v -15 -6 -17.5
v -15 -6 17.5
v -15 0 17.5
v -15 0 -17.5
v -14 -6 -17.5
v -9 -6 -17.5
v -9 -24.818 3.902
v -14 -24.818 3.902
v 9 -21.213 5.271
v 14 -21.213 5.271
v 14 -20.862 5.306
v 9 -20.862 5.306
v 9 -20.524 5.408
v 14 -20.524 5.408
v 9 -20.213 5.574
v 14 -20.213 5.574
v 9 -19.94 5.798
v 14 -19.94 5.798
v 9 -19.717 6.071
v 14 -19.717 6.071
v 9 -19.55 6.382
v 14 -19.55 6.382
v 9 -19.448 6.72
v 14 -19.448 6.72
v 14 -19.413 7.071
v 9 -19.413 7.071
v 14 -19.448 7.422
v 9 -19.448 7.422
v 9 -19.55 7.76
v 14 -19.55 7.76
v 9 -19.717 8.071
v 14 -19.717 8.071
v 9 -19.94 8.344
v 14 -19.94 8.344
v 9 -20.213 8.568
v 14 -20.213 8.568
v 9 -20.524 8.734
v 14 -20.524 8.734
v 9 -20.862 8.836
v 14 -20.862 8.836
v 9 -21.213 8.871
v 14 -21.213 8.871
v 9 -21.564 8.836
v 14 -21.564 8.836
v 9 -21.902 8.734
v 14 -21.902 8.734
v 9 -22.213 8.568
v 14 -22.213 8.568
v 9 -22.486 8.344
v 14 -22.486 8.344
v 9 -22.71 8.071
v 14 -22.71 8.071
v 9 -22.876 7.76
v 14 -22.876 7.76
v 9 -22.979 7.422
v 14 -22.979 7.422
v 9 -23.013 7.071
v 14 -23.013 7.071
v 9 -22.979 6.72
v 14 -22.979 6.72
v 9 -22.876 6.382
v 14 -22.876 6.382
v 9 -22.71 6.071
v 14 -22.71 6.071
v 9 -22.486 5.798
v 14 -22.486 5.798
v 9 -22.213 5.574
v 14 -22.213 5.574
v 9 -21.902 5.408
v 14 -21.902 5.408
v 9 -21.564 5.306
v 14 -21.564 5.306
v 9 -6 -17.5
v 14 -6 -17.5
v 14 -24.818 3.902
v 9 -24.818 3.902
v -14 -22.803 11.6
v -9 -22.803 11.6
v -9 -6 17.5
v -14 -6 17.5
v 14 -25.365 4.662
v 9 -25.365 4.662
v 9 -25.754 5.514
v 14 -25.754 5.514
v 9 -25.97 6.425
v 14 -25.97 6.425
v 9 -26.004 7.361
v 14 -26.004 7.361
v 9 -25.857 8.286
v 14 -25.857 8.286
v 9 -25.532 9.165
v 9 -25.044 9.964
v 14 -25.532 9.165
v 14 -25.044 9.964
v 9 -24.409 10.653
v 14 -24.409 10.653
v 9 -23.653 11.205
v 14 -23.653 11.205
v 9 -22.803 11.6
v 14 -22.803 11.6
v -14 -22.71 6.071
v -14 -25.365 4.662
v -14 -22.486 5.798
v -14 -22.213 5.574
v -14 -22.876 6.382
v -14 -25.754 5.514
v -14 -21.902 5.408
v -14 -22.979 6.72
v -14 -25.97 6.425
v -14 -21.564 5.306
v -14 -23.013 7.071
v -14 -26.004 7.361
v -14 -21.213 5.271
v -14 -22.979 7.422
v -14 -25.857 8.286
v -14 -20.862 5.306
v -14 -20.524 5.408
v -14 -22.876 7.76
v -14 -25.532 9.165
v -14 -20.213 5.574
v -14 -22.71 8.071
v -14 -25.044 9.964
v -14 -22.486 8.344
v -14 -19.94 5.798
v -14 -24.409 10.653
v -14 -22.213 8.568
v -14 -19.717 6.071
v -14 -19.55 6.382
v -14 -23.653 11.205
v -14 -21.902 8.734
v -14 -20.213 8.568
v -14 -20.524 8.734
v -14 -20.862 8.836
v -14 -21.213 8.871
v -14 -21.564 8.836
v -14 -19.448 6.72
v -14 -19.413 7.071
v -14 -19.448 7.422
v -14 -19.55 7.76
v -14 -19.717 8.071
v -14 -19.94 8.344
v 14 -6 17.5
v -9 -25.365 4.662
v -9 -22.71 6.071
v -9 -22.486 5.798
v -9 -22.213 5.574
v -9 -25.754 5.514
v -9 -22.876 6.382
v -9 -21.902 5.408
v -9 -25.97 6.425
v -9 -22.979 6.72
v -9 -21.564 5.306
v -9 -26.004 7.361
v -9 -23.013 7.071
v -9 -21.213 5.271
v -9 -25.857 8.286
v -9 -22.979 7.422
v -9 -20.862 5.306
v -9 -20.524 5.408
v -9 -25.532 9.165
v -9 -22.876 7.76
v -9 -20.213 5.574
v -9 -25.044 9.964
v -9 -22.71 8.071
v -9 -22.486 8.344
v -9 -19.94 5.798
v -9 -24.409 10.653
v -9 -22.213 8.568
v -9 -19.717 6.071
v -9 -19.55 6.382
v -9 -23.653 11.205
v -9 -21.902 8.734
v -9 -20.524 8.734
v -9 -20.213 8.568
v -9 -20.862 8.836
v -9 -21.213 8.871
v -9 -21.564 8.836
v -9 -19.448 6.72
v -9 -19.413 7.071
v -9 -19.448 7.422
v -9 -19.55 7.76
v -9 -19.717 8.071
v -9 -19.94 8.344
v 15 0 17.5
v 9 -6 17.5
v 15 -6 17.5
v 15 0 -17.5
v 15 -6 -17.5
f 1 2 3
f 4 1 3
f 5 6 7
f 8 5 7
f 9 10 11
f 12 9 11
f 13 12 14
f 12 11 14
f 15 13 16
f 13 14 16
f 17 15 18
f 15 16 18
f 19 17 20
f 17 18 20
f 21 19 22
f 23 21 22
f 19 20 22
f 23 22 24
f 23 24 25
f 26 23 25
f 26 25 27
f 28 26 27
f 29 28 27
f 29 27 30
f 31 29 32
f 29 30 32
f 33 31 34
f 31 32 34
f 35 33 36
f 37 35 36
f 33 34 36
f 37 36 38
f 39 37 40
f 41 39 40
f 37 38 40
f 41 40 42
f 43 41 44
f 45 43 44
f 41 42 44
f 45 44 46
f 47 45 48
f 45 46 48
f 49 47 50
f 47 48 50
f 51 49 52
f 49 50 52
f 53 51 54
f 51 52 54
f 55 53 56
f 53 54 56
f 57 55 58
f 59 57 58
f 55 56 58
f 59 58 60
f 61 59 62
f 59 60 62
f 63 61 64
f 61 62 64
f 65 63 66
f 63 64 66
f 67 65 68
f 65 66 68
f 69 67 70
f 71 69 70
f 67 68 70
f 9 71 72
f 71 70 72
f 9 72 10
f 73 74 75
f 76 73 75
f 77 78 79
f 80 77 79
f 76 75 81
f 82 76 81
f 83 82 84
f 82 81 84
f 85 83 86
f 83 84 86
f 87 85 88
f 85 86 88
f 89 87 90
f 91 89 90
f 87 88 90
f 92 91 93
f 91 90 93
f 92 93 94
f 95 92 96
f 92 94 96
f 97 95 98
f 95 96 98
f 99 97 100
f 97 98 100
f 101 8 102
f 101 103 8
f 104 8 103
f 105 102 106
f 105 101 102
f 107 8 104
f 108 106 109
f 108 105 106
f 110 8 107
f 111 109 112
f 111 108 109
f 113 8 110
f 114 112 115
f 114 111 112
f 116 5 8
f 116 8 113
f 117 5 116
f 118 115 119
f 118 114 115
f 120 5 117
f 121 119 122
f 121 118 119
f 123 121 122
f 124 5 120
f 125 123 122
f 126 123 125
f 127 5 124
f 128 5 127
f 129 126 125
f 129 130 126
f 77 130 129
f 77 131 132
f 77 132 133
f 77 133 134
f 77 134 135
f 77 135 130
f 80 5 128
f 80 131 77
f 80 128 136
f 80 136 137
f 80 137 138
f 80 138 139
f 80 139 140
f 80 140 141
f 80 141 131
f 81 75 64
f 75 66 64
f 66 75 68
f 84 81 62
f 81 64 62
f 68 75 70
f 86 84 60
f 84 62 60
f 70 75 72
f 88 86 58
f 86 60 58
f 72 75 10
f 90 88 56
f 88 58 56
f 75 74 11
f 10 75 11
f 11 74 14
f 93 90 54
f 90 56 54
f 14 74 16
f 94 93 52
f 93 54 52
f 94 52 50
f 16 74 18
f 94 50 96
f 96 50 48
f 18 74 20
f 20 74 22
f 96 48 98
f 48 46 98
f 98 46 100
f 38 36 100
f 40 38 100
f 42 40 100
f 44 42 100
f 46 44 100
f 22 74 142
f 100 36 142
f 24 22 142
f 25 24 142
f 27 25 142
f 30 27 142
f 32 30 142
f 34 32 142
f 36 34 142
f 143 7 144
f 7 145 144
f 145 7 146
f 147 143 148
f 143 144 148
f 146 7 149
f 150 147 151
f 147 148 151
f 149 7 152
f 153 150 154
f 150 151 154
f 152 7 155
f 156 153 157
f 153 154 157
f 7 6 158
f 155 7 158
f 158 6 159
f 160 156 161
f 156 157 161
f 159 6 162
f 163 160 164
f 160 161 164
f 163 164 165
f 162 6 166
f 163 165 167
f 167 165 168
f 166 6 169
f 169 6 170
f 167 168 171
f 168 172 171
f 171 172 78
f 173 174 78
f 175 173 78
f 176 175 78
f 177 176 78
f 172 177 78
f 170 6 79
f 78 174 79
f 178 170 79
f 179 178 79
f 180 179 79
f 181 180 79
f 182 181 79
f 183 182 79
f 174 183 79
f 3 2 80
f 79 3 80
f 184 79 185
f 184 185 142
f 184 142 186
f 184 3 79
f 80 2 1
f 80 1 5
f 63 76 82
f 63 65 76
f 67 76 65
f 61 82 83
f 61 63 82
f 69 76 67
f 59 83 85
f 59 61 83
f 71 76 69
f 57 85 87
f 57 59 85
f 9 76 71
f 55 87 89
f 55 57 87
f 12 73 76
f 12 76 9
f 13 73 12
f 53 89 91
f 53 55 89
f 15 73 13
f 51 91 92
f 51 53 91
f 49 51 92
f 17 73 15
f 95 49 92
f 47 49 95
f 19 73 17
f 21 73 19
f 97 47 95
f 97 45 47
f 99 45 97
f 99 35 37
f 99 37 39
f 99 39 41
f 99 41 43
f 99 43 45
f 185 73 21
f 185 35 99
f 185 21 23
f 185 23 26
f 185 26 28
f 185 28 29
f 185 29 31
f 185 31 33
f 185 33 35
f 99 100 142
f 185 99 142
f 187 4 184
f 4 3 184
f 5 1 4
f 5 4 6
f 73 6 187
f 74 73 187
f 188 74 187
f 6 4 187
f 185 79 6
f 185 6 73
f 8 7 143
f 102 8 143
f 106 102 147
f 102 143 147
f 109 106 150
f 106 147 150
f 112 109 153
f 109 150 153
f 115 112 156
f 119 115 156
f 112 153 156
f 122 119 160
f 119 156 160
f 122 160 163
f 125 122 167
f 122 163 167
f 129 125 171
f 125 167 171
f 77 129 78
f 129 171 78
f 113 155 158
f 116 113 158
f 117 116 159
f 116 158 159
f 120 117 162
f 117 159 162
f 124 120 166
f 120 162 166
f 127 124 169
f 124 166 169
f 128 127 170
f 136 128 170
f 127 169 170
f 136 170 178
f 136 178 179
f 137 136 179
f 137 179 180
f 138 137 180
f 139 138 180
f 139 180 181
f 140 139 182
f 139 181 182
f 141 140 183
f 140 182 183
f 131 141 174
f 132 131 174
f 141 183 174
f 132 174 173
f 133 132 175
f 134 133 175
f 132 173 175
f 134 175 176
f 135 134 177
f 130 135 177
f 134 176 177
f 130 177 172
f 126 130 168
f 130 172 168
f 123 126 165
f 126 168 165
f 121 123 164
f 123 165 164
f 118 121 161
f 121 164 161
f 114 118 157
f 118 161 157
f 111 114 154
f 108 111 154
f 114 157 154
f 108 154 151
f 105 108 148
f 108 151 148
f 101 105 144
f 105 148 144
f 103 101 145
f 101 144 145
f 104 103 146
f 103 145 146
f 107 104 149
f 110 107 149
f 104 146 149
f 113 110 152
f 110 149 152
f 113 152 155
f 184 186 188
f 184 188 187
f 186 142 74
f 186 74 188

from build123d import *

# Parameters (mm, degrees)
ESQUISSE1_W                = 30
ESQUISSE1_H                = 6
BOSS_EXTRU_1_DEPTH         = 17.5
ESQUISSE3_R                = 1.8
BOSS_EXTRU_2_DEPTH         = 5
R_P_TITION_LIN_AIRE1_COUNT = 2
R_P_TITION_LIN_AIRE1_PITCH = 23


with BuildPart() as part:
    # Esquisse1 → Boss.-Extru.1 (new, symmetric)
    with BuildSketch(Plane.XY):
        with Locations((0, -3)):
            Rectangle(ESQUISSE1_W, ESQUISSE1_H)
    extrude(amount=BOSS_EXTRU_1_DEPTH, both=True)

    # Esquisse3 → Boss.-Extru.2 (add)
    with BuildSketch(Plane(origin=(14, 0, 0), x_dir=(0, 0, -1), z_dir=(1, 0, 0))):
        with BuildLine():
            Line((-17.5, -6), (17.5, -6))
            Line((17.5, -6), (-3.901517868, -24.817916067))
            ThreePointArc((-3.901517868, -24.817916067), (-8.286202576, -25.856849364), (-11.600005345, -22.803399907))
            Line((-11.600005345, -22.803399907), (-17.5, -6))
        make_face()
        with Locations((-7.071067812, -21.213203436)):
            Circle(ESQUISSE3_R, mode=Mode.SUBTRACT)
    boss_extru_2 = extrude(amount=-BOSS_EXTRU_2_DEPTH)

    # Répétition linéaire1: Boss.-Extru.2 ×2
    with Locations(*[(-i * R_P_TITION_LIN_AIRE1_PITCH, 0, 0) for i in range(1, R_P_TITION_LIN_AIRE1_COUNT)]):
        add(boss_extru_2)


solid = part.part
